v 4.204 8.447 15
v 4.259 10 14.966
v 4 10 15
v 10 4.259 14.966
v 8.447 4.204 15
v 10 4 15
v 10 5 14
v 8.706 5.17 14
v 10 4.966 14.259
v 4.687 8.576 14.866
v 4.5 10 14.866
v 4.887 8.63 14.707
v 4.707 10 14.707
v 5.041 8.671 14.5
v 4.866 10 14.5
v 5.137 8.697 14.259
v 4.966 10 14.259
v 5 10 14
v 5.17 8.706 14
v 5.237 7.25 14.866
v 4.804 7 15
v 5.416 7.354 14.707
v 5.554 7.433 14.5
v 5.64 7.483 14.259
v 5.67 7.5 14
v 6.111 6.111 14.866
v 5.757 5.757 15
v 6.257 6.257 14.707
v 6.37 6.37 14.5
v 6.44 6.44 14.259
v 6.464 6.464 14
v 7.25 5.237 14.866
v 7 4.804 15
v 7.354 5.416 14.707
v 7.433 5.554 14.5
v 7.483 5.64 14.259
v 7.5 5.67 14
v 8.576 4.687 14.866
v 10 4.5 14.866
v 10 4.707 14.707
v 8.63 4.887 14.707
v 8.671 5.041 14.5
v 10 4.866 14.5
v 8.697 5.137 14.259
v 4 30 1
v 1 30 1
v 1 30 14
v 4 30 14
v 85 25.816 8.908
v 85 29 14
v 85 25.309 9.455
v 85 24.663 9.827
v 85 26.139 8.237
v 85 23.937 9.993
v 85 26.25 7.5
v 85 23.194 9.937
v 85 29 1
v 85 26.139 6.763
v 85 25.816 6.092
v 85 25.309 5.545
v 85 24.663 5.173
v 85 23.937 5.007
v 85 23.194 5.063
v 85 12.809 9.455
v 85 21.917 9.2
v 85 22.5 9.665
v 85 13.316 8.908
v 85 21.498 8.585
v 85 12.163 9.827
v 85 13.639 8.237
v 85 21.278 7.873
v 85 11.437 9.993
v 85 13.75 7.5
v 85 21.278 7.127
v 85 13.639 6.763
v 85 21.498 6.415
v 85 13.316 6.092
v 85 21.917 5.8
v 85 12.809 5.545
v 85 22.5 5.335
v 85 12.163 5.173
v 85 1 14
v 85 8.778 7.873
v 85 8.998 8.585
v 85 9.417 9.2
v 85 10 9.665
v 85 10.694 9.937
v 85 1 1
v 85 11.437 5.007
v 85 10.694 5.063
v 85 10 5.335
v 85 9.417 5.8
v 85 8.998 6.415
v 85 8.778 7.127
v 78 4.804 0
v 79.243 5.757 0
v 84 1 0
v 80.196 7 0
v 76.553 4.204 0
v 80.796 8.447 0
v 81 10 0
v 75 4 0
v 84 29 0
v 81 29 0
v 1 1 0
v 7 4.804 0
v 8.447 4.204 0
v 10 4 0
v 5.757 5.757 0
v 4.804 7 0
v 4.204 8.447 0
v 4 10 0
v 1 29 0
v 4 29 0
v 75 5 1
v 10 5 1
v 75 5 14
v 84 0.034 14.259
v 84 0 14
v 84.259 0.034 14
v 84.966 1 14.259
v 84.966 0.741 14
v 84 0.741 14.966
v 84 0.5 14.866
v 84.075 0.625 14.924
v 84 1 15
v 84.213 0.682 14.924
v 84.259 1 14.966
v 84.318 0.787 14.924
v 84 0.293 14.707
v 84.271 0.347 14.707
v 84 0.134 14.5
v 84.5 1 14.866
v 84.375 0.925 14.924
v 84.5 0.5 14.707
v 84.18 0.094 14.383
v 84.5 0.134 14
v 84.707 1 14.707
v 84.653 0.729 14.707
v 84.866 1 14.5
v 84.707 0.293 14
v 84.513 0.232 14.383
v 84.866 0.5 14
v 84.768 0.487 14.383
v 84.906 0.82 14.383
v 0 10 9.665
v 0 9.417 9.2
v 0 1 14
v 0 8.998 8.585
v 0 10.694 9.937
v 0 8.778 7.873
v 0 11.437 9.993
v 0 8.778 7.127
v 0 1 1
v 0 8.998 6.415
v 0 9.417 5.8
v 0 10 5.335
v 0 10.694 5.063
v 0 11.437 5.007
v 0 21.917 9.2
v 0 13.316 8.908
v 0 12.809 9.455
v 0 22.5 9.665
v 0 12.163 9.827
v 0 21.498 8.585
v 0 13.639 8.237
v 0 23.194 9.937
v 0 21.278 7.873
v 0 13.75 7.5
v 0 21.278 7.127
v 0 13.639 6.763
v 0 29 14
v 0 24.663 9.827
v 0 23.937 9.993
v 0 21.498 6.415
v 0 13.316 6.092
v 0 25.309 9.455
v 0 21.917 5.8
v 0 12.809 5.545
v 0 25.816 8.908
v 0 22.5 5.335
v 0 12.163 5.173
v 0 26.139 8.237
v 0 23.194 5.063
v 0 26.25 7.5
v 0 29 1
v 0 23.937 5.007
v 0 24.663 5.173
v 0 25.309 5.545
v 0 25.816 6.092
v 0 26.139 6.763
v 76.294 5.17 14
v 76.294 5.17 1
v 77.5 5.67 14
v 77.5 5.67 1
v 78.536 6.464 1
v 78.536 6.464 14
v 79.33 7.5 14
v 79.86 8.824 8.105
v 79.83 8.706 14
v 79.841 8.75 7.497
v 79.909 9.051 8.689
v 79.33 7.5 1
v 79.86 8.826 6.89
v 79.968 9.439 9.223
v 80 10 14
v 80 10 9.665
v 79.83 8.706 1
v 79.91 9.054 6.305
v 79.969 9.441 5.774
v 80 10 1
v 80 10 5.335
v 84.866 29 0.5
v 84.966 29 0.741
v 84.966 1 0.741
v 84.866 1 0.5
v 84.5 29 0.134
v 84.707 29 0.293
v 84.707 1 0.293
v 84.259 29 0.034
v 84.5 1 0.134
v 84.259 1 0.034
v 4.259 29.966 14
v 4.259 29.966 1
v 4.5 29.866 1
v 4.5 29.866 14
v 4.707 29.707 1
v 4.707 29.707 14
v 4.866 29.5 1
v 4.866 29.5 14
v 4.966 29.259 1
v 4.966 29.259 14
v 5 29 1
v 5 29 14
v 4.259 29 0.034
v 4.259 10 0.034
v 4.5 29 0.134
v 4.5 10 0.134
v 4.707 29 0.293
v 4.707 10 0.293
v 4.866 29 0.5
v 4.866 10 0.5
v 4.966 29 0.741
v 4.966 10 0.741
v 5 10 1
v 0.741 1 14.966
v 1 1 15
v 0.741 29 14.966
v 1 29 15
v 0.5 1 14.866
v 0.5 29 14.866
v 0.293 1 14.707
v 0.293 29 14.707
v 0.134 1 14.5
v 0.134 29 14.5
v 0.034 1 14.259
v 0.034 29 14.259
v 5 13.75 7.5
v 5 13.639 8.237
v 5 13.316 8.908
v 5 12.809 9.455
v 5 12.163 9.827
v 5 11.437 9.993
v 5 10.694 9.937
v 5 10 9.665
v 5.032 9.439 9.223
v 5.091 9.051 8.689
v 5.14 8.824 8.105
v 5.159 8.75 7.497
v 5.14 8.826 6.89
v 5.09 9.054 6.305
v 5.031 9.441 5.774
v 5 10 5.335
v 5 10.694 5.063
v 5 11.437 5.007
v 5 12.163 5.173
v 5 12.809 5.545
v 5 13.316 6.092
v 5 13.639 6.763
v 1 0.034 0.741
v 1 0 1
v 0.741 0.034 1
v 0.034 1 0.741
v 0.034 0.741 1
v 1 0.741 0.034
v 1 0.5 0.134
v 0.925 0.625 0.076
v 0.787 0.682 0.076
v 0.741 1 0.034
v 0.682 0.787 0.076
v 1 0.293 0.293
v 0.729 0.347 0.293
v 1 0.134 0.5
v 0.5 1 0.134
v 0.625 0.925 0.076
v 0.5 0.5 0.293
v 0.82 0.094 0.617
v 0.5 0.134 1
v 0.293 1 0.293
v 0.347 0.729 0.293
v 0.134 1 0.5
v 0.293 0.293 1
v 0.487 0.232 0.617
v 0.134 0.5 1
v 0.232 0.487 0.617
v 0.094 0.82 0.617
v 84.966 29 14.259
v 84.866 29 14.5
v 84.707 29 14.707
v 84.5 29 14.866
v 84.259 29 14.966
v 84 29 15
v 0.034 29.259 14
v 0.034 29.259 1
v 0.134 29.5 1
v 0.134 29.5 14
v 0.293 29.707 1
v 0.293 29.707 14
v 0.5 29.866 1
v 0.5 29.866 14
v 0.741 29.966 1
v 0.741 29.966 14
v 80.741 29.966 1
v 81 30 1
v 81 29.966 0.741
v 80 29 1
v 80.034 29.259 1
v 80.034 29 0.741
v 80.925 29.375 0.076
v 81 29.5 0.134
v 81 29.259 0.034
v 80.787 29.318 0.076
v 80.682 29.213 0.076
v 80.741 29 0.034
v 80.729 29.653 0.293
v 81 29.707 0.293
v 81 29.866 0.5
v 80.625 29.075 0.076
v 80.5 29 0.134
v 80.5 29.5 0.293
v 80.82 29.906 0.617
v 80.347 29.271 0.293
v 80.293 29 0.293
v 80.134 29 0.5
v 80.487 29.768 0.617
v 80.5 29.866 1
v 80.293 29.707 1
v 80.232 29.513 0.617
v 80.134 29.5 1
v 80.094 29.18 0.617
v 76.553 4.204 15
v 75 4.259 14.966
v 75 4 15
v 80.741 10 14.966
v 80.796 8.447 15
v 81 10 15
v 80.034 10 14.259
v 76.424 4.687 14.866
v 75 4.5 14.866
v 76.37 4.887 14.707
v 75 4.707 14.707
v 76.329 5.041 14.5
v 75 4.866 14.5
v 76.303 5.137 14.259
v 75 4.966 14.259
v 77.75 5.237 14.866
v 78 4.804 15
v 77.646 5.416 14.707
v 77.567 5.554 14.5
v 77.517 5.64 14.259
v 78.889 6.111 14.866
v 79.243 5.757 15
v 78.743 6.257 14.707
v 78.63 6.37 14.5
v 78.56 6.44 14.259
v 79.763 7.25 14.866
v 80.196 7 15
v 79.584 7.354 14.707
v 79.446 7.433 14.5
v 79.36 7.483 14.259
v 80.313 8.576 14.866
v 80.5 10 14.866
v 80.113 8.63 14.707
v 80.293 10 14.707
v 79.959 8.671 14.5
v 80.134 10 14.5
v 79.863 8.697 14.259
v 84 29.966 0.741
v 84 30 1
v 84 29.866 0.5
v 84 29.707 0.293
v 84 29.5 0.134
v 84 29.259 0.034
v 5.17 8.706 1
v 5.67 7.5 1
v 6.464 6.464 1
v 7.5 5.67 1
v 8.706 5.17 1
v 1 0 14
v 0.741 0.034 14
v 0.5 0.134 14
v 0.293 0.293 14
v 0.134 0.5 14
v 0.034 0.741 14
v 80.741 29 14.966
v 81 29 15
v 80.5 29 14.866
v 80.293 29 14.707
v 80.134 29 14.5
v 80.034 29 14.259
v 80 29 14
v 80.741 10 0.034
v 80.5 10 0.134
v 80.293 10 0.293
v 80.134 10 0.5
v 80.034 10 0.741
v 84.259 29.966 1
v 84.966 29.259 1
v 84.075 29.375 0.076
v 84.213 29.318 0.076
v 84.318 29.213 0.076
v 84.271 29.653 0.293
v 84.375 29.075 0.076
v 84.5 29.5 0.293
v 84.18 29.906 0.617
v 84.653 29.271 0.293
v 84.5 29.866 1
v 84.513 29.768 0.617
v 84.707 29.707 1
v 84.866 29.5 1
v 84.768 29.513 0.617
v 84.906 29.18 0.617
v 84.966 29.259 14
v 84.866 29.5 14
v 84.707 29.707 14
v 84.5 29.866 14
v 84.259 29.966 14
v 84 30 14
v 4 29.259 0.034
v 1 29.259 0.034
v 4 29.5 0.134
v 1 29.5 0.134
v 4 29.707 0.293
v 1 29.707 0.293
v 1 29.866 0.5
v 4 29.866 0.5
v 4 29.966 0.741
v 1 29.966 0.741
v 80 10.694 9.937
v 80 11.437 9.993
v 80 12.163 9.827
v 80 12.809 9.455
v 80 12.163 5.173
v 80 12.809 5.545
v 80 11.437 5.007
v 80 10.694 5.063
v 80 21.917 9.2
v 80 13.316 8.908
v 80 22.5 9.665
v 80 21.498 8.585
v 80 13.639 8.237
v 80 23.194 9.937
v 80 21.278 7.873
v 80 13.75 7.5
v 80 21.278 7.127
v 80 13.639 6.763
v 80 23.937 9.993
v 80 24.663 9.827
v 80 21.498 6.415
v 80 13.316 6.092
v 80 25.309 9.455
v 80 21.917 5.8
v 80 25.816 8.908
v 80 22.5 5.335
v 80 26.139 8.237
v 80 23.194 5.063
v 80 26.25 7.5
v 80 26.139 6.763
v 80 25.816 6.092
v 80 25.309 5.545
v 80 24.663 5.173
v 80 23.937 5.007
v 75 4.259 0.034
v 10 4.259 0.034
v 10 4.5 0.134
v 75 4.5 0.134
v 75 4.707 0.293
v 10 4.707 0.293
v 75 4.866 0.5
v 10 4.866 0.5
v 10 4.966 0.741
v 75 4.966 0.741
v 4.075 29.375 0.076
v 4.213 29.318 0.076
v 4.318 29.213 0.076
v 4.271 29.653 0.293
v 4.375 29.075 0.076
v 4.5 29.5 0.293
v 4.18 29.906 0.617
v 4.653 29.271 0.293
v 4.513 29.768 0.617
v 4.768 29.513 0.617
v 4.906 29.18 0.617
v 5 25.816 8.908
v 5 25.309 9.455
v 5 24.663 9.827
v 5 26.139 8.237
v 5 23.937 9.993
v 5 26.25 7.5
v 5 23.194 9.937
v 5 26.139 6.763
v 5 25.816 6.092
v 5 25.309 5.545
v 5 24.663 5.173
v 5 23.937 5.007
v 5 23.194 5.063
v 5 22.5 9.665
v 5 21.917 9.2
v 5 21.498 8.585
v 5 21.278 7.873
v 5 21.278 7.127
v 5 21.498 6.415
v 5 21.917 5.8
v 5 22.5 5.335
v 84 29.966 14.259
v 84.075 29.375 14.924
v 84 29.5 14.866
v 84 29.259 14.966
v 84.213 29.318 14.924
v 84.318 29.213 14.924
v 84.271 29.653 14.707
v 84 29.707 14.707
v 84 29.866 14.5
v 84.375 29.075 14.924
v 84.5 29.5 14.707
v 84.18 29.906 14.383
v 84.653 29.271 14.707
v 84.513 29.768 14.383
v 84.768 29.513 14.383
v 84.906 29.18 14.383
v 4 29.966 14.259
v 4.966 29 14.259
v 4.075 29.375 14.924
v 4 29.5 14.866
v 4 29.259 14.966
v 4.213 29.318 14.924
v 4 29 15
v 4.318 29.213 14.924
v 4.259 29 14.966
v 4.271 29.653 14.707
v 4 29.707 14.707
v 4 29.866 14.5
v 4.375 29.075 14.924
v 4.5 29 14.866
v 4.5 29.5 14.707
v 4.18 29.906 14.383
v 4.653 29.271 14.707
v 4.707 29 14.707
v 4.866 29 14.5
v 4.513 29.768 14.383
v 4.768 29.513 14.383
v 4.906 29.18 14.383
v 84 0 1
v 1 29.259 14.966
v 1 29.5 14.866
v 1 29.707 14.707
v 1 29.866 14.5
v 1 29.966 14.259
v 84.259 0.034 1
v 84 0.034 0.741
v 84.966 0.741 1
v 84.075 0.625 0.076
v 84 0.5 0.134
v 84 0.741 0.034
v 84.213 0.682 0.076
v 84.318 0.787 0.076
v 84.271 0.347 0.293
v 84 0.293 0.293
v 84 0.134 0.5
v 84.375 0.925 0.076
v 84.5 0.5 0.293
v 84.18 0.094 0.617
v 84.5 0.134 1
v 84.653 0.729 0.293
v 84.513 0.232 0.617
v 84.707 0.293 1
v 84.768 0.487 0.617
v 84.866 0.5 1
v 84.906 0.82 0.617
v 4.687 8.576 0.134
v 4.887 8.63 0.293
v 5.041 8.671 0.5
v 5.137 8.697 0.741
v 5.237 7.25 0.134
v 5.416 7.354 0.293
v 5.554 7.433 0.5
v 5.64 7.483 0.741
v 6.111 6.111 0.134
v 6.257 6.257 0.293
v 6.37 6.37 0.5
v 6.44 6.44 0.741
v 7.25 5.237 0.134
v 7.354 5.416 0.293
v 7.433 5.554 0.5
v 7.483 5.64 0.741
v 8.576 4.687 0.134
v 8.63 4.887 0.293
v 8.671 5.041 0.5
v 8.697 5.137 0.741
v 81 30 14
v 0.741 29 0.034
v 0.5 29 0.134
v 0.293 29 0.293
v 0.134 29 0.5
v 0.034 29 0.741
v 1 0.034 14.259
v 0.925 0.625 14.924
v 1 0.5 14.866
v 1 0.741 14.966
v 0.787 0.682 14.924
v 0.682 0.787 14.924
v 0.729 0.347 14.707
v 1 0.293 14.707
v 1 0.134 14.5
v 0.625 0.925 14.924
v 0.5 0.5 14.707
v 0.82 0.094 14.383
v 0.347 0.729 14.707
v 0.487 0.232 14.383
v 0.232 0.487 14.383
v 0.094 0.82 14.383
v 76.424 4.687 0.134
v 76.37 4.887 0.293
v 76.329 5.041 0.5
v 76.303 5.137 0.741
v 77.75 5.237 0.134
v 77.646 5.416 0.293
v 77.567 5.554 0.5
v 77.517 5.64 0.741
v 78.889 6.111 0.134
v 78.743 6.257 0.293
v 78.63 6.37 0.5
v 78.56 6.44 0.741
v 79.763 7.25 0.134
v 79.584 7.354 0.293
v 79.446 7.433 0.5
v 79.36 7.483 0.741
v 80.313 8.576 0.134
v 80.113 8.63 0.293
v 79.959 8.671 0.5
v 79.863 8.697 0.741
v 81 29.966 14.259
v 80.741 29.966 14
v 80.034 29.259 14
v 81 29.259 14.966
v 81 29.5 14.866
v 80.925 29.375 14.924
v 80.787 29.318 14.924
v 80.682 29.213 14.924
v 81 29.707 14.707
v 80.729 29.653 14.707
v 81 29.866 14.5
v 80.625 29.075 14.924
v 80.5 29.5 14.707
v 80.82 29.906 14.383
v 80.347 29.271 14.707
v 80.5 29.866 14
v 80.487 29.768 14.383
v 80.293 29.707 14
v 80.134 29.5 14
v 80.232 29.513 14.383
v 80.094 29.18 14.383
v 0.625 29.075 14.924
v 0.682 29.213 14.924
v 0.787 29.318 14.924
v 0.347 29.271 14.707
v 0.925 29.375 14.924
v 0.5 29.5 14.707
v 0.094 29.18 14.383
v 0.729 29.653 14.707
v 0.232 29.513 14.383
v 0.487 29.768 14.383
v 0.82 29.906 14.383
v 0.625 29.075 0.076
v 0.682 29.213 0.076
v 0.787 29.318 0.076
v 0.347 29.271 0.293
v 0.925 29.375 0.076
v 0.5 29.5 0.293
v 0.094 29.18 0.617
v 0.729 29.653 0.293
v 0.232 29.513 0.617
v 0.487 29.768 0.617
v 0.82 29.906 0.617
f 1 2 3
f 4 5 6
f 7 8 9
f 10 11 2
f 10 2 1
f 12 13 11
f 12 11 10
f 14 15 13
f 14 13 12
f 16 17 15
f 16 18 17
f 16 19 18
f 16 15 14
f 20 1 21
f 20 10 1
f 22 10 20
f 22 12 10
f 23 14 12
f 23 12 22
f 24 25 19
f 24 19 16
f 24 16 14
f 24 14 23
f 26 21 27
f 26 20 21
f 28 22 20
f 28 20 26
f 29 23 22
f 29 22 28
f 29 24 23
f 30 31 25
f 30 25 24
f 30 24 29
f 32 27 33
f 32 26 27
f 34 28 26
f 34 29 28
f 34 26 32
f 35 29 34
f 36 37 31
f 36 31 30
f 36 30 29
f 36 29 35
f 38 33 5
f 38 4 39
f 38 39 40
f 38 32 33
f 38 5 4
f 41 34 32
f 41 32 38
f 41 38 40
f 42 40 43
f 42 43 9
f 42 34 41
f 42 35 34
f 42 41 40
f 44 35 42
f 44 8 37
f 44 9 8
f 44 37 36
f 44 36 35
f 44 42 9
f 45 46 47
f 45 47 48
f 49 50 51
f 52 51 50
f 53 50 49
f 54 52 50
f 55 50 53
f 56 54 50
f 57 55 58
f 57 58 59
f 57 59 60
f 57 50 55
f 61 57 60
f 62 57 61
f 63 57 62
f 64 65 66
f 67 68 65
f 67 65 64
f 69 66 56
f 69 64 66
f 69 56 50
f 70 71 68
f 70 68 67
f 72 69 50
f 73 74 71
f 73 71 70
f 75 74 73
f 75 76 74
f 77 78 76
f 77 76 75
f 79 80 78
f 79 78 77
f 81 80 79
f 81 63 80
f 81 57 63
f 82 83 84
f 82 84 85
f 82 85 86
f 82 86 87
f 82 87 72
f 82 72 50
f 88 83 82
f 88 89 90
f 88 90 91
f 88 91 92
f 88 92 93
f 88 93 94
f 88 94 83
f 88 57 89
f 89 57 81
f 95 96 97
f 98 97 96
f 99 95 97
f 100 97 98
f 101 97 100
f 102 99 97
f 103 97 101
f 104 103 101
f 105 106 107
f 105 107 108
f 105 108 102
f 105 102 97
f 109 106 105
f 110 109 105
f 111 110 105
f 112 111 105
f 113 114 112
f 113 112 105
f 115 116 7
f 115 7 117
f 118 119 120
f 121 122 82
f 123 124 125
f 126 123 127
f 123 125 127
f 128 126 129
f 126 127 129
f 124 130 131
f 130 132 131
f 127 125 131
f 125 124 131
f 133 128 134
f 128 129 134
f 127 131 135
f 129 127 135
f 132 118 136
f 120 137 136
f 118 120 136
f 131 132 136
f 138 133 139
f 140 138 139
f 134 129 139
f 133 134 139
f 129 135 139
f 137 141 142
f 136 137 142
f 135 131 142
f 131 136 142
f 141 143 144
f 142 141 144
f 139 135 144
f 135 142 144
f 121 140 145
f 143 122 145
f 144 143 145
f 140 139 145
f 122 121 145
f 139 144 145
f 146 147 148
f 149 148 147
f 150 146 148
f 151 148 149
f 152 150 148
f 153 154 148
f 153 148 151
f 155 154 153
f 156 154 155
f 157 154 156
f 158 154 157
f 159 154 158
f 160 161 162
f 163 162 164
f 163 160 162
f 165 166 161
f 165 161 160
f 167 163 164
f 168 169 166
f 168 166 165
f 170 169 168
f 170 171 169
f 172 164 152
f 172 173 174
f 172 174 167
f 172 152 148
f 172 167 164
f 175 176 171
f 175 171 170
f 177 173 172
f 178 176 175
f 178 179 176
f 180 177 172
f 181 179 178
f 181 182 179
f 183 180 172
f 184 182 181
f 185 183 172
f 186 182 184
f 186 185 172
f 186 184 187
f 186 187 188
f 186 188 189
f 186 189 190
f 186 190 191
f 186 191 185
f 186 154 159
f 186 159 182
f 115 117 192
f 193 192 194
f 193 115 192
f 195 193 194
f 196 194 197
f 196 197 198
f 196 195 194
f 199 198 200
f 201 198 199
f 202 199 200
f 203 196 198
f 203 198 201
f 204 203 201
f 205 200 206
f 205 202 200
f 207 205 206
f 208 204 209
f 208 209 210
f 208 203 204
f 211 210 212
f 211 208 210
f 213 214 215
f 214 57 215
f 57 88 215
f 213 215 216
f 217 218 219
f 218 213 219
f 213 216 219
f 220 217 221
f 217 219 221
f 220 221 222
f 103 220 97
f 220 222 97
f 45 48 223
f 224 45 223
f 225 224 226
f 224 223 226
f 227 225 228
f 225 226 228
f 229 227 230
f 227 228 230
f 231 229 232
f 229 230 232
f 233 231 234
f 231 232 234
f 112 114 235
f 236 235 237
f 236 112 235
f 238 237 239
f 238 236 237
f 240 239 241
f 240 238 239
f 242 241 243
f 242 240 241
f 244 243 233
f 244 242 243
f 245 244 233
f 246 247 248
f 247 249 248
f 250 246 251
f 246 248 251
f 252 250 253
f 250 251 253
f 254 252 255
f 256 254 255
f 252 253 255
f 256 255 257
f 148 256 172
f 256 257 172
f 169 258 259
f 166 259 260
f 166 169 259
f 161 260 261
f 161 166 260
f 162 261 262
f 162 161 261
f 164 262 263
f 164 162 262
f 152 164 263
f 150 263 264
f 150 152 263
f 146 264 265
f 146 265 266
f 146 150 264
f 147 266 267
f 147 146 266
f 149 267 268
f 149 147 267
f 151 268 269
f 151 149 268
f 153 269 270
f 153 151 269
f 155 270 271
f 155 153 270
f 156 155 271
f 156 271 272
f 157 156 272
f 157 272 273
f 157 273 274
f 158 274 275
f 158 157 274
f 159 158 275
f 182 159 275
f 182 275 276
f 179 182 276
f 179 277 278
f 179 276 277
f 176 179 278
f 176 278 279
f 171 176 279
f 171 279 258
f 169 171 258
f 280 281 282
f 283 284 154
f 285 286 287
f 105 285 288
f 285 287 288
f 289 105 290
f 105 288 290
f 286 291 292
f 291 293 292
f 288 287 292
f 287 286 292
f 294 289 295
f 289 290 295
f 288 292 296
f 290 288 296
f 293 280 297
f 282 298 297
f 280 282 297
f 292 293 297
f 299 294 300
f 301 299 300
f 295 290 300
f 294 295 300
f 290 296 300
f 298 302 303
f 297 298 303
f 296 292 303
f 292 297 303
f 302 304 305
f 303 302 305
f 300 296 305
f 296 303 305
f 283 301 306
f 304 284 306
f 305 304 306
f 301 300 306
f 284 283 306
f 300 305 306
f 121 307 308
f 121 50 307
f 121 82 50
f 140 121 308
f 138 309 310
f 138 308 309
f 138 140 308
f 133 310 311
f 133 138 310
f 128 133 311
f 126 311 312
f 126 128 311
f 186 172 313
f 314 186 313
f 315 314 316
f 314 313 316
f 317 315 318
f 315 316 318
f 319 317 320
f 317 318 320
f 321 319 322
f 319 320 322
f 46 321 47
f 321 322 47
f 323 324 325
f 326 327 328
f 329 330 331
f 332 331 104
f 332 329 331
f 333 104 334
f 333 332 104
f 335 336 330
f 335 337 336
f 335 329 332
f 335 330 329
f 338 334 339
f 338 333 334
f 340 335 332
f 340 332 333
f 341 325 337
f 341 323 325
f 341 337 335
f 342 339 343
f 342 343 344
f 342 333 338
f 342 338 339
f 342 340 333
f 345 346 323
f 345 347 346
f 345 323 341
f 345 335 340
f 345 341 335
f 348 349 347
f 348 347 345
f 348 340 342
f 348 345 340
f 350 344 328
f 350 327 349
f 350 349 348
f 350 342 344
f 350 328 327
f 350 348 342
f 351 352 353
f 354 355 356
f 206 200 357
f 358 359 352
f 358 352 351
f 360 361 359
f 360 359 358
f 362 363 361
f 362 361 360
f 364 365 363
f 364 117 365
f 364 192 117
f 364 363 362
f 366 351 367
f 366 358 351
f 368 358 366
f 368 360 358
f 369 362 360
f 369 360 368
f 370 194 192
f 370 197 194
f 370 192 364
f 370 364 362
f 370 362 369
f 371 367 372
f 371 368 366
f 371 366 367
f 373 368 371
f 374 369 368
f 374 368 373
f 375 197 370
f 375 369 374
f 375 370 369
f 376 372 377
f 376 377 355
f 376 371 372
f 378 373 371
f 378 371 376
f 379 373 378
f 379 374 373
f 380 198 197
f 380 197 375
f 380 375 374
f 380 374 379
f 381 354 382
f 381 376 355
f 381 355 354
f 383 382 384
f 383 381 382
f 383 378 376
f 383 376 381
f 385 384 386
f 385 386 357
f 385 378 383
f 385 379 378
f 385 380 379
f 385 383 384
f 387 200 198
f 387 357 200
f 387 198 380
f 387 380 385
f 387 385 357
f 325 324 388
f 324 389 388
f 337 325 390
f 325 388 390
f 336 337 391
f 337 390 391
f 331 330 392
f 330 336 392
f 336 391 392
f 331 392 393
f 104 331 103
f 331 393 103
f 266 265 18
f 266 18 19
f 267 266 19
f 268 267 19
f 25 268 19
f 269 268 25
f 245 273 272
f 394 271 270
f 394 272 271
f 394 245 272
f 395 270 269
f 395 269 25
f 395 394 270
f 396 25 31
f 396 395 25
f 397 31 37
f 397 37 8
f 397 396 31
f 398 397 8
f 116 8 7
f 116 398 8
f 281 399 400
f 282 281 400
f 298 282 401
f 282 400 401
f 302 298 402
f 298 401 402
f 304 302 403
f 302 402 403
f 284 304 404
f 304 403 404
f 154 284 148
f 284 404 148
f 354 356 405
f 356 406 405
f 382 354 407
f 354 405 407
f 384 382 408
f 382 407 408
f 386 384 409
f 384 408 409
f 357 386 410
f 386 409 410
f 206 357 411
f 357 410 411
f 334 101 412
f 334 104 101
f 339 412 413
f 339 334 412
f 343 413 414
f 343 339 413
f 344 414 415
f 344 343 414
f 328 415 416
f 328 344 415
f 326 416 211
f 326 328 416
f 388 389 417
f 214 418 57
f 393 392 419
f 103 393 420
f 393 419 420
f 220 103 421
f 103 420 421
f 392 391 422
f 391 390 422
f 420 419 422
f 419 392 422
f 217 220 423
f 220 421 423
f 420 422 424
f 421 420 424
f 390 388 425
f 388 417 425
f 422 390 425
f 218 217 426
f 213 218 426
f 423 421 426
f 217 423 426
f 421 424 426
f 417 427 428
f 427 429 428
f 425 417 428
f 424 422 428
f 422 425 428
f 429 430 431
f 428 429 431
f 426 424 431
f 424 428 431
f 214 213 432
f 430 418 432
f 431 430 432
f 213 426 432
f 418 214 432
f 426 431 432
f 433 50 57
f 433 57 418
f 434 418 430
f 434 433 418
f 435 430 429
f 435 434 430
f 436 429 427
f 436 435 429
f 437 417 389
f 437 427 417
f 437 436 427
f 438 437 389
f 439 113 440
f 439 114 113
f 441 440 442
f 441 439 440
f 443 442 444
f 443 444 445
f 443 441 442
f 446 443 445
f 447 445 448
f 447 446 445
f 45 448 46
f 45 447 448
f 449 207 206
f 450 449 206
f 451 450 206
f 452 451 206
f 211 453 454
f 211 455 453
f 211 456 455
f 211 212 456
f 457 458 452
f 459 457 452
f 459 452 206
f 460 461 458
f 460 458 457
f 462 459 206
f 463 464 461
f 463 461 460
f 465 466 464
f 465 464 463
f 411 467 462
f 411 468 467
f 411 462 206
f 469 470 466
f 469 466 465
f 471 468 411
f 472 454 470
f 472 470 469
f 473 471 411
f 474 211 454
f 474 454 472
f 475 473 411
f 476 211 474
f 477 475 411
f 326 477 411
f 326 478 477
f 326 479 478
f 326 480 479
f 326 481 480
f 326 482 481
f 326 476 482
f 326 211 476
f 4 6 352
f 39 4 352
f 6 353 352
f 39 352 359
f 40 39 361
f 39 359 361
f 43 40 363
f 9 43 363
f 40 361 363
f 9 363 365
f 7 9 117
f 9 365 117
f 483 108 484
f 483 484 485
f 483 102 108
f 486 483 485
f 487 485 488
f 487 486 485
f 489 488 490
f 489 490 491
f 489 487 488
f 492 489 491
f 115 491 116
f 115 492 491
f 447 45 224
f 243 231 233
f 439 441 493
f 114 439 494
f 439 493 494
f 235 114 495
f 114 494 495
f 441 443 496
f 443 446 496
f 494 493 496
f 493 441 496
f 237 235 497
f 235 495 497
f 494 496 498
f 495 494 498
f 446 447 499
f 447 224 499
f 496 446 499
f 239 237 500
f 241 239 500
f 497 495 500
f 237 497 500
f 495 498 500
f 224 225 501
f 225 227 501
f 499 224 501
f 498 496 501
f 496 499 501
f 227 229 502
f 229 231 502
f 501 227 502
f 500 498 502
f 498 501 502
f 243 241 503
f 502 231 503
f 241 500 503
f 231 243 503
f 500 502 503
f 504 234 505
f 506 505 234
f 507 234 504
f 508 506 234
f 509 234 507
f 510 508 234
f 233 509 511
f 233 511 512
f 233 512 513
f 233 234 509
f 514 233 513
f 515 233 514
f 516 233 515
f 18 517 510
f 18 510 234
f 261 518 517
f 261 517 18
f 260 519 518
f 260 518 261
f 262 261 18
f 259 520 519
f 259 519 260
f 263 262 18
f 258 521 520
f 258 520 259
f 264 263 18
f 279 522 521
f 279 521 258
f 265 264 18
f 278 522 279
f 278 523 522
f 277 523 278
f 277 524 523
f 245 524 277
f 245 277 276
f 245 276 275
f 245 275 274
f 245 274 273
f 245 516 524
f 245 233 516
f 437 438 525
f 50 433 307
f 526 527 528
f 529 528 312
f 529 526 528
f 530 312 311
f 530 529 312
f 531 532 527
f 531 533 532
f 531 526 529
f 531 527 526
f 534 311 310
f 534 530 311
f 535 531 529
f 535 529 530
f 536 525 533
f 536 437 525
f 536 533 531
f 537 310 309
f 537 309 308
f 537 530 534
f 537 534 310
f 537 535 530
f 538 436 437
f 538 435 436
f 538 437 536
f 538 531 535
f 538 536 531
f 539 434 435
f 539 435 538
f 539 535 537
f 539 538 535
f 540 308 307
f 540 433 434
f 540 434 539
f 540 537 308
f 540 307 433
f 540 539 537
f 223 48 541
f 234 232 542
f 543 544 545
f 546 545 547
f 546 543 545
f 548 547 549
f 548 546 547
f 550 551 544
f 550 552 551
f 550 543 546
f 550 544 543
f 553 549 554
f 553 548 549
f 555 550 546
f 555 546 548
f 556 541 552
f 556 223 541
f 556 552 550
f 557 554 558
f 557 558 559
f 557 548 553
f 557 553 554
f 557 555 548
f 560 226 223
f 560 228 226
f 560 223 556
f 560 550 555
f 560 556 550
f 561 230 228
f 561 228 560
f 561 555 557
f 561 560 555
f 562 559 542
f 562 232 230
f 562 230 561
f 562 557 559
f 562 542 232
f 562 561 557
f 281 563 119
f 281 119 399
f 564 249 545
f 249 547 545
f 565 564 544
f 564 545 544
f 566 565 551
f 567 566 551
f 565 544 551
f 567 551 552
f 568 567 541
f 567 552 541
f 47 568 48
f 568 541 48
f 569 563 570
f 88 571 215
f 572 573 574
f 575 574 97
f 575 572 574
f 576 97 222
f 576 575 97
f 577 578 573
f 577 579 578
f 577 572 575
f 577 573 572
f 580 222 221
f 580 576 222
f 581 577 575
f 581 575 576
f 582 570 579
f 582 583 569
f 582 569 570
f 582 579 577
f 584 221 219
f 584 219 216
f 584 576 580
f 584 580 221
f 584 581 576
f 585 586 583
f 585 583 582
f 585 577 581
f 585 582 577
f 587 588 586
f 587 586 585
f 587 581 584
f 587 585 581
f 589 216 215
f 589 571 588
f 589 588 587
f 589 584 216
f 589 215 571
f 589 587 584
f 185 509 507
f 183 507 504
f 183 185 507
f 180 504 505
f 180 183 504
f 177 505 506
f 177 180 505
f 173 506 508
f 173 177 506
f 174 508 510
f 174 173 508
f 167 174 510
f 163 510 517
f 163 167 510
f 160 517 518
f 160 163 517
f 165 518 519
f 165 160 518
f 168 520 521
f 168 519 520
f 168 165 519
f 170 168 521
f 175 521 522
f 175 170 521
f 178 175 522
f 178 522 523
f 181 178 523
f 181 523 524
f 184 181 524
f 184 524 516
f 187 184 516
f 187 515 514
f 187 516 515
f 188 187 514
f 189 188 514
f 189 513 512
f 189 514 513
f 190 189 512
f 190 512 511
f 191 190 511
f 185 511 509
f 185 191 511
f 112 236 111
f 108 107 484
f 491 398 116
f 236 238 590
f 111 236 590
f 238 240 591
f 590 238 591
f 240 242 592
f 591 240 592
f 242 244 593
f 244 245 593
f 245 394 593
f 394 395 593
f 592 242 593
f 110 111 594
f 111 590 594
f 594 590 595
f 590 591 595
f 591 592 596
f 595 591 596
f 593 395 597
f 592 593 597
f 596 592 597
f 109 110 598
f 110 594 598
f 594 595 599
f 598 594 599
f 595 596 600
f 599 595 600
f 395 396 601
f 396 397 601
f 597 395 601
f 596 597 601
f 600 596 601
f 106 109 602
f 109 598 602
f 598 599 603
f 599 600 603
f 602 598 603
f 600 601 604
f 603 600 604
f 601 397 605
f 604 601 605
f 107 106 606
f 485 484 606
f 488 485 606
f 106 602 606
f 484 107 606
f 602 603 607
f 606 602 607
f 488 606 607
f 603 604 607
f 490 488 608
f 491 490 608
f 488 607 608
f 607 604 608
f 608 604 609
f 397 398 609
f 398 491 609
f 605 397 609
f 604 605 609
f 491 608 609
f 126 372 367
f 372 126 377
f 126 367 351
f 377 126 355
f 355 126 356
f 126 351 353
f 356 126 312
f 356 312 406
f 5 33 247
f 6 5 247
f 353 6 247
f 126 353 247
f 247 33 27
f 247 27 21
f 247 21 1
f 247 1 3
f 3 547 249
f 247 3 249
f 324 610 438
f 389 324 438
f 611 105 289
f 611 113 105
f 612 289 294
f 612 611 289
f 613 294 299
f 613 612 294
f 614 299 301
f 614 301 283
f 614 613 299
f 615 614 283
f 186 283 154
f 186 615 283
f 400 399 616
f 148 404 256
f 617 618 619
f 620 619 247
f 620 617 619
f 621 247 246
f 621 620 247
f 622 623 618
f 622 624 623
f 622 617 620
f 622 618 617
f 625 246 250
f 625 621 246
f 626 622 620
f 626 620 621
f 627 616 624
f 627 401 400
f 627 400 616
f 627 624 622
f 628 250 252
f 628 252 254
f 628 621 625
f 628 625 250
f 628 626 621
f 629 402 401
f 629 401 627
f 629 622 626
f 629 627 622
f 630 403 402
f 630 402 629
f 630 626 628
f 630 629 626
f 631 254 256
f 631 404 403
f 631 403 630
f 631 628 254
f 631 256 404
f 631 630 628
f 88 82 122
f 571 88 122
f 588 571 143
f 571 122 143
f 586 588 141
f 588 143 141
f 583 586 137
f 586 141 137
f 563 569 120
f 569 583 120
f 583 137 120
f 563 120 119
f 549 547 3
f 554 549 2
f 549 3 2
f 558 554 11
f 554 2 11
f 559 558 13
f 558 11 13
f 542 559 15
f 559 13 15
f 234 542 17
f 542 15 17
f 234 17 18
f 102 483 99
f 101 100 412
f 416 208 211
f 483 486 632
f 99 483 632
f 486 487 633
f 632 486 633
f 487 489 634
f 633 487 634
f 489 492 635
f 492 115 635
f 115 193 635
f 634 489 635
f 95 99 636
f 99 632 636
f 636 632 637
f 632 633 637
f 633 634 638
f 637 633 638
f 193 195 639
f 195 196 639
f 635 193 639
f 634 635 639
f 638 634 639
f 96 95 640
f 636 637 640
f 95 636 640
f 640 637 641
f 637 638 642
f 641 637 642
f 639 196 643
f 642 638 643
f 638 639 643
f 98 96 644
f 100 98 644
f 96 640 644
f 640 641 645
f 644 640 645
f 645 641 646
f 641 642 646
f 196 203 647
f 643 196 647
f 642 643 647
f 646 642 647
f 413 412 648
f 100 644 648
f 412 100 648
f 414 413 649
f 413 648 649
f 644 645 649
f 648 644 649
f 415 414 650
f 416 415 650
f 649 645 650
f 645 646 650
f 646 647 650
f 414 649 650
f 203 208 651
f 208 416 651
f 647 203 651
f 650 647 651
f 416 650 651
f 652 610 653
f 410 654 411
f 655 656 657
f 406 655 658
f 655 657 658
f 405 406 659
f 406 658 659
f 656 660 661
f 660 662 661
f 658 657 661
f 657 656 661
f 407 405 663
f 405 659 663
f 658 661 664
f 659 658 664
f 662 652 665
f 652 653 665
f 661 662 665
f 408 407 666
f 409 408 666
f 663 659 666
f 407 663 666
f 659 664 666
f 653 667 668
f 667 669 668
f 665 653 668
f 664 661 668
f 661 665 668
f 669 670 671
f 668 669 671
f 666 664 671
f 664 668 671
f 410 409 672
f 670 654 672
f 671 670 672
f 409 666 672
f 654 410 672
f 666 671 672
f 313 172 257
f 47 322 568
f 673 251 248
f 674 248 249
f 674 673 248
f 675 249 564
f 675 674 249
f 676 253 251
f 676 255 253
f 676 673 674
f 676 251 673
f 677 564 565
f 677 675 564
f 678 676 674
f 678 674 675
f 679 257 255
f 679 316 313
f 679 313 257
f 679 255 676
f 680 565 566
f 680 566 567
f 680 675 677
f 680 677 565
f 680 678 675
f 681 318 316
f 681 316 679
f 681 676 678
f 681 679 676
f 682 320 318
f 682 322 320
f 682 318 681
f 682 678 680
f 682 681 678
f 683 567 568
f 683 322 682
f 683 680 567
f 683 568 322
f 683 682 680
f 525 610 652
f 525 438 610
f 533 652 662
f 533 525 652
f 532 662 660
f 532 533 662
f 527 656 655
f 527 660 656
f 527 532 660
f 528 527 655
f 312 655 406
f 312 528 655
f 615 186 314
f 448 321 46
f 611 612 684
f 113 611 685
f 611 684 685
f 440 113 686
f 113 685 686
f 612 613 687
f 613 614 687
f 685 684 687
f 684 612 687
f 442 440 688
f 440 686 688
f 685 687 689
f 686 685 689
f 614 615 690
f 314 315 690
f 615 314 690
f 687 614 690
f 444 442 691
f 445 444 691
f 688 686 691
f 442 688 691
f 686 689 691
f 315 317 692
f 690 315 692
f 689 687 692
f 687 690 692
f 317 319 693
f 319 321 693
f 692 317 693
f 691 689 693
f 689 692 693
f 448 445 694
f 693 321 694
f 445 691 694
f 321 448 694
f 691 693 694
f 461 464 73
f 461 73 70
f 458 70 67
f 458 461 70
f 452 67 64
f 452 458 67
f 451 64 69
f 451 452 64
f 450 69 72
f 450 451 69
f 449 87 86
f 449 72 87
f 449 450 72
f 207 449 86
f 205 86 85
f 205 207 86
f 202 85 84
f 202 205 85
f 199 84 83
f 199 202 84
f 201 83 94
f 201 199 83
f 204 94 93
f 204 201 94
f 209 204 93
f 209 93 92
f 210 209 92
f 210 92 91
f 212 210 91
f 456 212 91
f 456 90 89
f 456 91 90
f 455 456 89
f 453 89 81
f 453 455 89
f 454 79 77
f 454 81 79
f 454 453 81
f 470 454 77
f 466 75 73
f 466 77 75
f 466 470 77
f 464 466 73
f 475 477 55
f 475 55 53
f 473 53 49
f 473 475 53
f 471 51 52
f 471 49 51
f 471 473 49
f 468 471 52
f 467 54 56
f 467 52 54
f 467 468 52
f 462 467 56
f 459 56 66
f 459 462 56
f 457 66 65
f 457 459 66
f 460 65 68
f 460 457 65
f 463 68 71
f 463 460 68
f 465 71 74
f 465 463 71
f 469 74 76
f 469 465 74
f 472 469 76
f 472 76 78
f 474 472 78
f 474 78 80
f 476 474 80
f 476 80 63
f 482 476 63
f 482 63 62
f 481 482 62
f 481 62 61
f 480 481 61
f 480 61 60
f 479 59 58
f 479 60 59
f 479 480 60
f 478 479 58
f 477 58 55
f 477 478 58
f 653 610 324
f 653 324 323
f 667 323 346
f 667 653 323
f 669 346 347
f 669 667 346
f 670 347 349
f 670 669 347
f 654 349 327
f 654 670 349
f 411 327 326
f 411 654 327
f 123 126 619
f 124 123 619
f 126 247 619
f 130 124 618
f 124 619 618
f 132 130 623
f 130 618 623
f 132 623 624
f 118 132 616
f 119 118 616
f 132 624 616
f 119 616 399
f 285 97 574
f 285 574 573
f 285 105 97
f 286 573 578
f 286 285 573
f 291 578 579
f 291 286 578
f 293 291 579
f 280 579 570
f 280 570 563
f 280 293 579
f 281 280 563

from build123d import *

# Parameters (mm, degrees)
PAD_DEPTH         = 15
SKETCH001_R       = 2.5
POCKET_DEPTH      = 0.001
POCKET_DEPTH_BACK = -85.001
FILLET_R          = 1


with BuildPart() as part:
    # Sketch → Pad (new body)
    with BuildSketch(Plane.XY):
        with BuildLine():
            Line((85, 30), (85, 0))
            Line((85, 0), (0, 0))
            Line((0, 0), (0, 30))
            Line((0, 30), (5, 30))
            Line((5, 30), (5, 10))
            ThreePointArc((5, 10), (6.464466, 6.464466), (10, 5))
            Line((10, 5), (75, 5))
            ThreePointArc((75, 5), (78.535534, 6.464466), (80, 10))
            Line((80, 10), (80, 30))
            Line((80, 30), (85, 30))
        make_face()
    extrude(amount=PAD_DEPTH)

    # Sketch001 → Pocket (cut, two sides)
    with BuildSketch(Plane.YZ) as pocket_sk:
        with Locations((11.25, 7.5)):
            Circle(SKETCH001_R)
        with Locations((23.75, 7.5)):
            Circle(SKETCH001_R)
    extrude(amount=-POCKET_DEPTH, mode=Mode.SUBTRACT)
    extrude(pocket_sk.sketch, amount=-POCKET_DEPTH_BACK, mode=Mode.SUBTRACT)

    # Fillet
    fillet_edges = [part.edges().sort_by_distance(p)[0] for p in [
        (85, 30, 7.5),
        (80, 30, 7.5),
        (82.5, 30, 0),
        (82.5, 30, 15),
        (85, 0, 7.5),
        (5, 30, 7.5),
        (0, 30, 7.5),
        (0, 0, 7.5),
        (42.5, 0, 15),
        (42.5, 0, 0),
        (85, 15, 15),
        (0, 15, 15),
        (2.5, 30, 15),
        (5, 20, 15),
        (6.464466, 6.464466, 15),
        (42.5, 5, 15),
        (78.535534, 6.464466, 15),
        (80, 20, 15),
        (85, 15, 0),
        (0, 15, 0),
        (2.5, 30, 0),
        (5, 20, 0),
        (6.464466, 6.464466, 0),
        (42.5, 5, 0),
        (78.535534, 6.464466, 0),
        (80, 20, 0),
    ]]
    fillet(fillet_edges, radius=FILLET_R)


solid = part.part
